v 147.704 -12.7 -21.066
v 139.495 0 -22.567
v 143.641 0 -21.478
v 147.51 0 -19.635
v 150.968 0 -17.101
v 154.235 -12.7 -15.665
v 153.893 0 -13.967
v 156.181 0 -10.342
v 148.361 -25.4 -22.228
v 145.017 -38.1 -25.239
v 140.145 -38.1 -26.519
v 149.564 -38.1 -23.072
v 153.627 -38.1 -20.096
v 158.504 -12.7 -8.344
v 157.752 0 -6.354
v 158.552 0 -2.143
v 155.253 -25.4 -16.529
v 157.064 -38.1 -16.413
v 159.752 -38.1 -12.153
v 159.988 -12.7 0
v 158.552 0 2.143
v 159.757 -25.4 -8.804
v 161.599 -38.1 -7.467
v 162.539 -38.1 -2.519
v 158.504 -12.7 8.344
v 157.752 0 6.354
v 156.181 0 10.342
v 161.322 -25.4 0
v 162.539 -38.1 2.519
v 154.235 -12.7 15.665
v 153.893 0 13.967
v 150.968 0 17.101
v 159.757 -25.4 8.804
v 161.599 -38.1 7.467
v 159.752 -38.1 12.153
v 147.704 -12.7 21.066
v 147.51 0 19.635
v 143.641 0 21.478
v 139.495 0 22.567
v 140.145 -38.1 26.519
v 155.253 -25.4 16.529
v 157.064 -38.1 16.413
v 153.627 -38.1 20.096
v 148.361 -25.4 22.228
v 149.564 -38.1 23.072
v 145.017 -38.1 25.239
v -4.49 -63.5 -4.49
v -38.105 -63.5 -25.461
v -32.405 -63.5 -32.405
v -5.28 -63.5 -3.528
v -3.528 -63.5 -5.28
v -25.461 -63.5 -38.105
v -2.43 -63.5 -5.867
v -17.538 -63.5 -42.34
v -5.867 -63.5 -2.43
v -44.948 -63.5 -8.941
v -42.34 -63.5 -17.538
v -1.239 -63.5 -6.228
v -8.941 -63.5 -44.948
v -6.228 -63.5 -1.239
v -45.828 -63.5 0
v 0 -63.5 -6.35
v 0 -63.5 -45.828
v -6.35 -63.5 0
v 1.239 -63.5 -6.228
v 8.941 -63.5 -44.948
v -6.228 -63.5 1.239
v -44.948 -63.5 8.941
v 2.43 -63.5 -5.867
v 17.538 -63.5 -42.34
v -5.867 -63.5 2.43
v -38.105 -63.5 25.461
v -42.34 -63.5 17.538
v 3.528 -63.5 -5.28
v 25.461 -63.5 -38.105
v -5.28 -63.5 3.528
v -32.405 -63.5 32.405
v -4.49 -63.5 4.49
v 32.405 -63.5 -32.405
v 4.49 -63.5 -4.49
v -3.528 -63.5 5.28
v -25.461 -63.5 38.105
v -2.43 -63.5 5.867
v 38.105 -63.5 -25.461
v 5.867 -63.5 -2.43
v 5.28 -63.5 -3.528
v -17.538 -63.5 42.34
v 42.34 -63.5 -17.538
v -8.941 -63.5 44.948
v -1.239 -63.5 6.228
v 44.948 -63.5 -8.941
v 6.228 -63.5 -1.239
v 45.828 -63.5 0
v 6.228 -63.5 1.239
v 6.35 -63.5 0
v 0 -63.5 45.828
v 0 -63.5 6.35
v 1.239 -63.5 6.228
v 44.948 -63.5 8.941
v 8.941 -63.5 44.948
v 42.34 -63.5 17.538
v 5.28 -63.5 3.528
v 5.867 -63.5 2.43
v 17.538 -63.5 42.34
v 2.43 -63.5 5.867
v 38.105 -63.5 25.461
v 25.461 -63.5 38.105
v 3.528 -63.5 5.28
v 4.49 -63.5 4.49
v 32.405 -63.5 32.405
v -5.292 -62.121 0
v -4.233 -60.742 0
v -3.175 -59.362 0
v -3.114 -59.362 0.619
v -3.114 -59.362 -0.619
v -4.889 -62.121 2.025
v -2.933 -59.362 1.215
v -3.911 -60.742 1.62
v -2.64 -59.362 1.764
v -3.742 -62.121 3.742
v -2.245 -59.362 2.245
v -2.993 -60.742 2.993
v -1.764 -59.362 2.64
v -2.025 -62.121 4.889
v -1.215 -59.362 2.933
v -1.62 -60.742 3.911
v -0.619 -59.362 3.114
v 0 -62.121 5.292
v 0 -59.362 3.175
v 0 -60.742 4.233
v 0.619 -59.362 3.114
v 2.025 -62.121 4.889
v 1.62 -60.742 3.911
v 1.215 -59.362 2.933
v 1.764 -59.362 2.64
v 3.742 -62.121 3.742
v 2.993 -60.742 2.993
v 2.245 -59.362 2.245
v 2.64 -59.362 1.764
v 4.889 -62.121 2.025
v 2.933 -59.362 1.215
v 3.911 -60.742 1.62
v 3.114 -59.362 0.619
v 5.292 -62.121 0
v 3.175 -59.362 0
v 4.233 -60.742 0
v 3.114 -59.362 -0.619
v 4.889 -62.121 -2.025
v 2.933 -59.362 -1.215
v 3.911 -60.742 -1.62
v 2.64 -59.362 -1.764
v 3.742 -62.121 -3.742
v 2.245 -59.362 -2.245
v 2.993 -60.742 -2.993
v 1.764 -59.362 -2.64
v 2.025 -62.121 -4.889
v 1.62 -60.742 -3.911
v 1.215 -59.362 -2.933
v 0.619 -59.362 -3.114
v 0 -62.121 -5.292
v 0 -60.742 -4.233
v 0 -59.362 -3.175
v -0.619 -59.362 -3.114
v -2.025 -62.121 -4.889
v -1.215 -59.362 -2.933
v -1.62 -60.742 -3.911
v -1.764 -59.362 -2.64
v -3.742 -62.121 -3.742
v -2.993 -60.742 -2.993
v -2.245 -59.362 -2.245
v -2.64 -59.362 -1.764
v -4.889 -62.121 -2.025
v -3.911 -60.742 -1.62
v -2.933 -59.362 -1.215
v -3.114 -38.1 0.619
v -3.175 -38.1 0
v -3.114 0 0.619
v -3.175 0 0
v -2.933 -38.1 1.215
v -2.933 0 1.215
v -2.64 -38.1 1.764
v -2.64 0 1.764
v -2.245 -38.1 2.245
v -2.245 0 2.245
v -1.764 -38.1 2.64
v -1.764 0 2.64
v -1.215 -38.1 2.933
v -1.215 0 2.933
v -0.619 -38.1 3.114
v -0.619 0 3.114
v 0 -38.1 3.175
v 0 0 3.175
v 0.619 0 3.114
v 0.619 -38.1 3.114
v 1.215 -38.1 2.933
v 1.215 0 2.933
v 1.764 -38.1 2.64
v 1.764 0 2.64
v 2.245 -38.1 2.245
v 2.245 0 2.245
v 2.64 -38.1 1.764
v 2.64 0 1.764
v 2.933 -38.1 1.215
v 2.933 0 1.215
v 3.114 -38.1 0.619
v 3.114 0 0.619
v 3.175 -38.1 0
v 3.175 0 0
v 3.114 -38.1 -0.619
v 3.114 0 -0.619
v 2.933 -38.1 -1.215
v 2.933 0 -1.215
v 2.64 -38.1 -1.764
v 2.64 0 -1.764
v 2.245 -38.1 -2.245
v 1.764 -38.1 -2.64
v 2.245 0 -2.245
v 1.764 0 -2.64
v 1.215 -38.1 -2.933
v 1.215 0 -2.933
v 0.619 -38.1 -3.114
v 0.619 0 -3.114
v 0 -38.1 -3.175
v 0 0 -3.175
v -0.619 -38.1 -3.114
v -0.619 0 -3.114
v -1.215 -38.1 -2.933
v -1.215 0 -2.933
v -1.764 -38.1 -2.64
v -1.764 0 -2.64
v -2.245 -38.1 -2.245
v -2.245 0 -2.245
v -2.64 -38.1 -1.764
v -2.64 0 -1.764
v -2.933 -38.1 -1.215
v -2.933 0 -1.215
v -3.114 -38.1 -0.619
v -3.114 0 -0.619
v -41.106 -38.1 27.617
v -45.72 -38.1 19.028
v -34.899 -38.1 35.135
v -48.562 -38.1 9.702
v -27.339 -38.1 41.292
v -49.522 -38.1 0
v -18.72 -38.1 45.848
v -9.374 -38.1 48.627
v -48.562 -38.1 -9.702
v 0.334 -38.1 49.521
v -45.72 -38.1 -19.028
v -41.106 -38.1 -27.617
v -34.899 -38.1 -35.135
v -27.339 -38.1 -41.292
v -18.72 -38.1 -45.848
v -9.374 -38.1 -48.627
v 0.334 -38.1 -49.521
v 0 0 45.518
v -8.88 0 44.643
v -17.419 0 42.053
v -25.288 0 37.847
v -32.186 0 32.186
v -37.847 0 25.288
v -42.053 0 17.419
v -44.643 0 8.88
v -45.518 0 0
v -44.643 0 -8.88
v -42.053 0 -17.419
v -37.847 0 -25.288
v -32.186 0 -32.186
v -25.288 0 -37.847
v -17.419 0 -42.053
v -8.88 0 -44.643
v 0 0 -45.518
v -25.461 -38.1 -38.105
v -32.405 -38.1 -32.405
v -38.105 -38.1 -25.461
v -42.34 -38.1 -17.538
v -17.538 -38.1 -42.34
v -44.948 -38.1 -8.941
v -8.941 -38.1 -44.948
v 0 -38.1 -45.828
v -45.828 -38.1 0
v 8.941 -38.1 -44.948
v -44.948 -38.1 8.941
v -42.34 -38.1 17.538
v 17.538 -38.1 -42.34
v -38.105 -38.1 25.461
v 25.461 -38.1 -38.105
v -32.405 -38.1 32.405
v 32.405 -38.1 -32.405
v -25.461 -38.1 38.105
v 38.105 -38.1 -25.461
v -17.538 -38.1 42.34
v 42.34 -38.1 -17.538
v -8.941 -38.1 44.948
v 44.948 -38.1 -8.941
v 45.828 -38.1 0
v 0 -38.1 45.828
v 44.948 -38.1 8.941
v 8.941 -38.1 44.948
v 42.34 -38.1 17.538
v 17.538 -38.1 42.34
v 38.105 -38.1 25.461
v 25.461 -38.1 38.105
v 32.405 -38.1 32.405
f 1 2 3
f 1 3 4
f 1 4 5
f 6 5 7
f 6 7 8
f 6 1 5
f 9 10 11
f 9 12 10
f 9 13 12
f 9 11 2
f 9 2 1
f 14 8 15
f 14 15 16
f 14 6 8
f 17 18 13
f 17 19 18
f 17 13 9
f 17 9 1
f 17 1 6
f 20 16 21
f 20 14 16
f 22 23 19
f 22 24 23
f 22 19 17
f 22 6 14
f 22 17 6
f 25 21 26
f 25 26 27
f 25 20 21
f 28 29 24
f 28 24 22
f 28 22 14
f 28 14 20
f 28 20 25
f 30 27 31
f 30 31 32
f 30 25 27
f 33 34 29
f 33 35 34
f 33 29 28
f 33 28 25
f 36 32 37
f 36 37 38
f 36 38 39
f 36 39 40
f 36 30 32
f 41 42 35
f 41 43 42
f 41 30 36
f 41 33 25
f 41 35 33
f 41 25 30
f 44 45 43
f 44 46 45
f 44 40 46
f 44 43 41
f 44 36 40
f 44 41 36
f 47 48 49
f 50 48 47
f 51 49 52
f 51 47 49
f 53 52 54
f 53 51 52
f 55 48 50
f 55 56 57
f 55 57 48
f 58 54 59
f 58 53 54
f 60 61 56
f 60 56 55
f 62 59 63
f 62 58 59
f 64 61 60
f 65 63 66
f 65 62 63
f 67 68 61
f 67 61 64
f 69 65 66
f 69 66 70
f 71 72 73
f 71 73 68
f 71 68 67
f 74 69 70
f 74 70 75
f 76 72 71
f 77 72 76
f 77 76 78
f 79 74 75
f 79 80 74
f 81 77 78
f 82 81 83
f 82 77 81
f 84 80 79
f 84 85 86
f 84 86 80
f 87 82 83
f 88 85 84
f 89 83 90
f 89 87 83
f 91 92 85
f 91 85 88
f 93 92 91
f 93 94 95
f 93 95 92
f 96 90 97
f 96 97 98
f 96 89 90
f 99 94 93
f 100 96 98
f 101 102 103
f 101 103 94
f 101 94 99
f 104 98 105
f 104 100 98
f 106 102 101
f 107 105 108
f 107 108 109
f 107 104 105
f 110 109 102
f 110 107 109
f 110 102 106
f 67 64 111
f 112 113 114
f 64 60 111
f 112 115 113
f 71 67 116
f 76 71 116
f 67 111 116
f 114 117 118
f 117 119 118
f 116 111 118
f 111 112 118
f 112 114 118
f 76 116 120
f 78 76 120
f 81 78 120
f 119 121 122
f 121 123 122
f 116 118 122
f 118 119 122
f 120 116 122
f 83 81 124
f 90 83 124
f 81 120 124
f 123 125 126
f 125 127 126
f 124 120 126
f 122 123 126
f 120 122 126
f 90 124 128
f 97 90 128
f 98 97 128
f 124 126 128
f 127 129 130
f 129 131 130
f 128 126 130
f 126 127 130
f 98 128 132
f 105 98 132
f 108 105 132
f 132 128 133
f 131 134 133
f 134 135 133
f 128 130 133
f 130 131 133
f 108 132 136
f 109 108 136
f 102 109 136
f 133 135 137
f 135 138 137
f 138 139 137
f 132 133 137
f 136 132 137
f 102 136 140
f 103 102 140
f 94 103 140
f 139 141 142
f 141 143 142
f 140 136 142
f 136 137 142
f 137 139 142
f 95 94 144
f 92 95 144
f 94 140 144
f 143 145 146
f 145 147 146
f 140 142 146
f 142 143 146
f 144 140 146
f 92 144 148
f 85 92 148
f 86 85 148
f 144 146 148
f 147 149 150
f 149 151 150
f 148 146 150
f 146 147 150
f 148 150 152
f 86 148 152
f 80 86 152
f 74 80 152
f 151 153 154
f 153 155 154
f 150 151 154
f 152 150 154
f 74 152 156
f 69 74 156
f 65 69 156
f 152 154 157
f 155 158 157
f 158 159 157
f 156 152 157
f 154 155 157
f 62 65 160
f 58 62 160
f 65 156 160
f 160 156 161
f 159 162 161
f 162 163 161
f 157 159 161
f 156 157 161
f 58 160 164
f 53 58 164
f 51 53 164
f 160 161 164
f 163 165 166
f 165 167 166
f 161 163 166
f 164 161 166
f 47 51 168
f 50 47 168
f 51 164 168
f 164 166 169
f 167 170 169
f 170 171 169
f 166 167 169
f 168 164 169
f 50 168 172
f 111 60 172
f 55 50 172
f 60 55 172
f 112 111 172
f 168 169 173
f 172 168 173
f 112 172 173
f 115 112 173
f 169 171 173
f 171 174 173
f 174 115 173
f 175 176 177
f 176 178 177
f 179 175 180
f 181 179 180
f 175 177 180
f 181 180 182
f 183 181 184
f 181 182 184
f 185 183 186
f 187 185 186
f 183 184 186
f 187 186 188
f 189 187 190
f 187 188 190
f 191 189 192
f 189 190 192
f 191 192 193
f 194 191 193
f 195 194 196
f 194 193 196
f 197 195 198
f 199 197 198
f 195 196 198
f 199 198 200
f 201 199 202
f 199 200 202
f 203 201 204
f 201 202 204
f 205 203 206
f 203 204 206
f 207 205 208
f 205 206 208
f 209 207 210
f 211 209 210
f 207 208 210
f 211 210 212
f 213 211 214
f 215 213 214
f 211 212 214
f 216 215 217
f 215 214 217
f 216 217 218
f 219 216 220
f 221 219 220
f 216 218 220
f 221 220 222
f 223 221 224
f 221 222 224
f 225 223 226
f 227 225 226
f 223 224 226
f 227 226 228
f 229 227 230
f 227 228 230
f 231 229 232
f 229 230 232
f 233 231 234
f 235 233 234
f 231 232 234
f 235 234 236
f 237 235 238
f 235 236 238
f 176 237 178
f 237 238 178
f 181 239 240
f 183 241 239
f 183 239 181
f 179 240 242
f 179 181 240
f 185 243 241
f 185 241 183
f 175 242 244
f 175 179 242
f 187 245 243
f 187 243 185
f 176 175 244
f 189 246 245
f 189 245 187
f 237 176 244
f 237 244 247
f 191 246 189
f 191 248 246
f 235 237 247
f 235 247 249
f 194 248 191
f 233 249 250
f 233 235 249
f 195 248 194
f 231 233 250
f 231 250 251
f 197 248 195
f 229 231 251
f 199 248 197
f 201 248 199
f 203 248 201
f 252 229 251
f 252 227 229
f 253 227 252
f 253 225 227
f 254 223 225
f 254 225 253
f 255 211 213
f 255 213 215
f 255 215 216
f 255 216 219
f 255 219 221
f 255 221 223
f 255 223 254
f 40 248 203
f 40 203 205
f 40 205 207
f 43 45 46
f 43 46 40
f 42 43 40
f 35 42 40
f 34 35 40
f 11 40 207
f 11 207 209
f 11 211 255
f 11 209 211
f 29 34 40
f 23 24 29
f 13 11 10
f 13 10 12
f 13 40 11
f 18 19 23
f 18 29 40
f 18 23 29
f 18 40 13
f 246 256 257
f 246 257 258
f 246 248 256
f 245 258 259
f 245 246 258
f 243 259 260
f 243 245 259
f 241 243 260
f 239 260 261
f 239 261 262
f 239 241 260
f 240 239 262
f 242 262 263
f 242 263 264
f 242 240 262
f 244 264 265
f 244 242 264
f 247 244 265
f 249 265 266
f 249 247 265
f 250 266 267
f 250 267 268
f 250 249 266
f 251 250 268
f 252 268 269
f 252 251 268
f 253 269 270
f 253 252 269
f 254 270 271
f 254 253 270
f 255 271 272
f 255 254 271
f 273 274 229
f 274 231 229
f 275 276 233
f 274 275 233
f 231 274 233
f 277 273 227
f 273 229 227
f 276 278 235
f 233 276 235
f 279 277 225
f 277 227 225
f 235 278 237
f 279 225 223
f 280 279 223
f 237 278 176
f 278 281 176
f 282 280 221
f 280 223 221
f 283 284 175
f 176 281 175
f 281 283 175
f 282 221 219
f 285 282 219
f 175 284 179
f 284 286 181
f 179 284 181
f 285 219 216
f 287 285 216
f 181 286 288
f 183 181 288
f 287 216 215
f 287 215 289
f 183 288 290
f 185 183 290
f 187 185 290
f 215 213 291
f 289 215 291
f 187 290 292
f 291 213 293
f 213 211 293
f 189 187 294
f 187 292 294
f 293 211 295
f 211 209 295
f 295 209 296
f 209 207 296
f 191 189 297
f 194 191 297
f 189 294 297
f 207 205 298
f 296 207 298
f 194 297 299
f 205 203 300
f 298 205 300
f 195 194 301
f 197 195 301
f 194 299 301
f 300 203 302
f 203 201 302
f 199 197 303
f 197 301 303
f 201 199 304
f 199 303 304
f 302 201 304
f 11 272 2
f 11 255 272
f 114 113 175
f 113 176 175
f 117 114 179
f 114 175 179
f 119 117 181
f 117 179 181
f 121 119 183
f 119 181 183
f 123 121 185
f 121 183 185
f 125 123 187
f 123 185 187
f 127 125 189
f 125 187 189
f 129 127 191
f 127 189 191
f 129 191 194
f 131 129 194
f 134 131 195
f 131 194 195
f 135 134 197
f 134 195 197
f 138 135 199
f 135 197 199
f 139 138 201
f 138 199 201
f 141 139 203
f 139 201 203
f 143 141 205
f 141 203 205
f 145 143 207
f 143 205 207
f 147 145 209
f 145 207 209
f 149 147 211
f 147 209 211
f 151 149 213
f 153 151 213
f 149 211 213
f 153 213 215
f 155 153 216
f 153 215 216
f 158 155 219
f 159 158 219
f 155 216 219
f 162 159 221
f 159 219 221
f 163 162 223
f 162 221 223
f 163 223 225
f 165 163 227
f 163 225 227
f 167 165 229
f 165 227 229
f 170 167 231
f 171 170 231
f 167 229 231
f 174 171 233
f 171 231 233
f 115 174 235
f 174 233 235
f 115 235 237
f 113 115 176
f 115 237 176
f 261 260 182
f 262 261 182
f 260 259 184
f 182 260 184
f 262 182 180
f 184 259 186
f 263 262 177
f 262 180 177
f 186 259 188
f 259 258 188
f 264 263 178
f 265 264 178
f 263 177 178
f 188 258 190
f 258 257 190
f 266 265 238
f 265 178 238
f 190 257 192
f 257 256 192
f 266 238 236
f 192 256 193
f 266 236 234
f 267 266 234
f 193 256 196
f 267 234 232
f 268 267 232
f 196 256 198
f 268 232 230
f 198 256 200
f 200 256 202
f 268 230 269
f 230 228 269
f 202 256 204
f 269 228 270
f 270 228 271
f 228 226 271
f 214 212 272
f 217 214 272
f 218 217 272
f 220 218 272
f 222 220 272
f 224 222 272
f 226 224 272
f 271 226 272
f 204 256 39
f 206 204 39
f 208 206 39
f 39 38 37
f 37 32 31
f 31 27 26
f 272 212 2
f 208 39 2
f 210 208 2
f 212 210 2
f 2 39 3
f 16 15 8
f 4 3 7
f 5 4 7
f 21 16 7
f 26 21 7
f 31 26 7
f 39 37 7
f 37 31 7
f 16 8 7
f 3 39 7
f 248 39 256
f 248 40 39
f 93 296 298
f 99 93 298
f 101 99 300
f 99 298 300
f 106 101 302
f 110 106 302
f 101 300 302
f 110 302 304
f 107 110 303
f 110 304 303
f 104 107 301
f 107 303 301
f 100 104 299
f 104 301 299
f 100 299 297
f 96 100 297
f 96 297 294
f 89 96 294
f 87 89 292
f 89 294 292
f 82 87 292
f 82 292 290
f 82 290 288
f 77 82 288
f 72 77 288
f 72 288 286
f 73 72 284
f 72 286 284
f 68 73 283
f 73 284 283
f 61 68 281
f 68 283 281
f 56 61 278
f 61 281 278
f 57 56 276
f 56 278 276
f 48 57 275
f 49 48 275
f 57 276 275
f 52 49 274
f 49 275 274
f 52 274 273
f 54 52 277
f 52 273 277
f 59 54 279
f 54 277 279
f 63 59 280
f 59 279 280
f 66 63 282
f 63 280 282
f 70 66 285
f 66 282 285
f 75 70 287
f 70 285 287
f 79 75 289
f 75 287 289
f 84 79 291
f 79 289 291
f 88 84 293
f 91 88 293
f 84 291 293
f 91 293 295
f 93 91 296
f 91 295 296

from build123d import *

# Parameters (mm, degrees)
F1_DEPTH         = 38.1
F1_TAPER         = -6
F2_R             = 45.8282272946
F3_DEPTH         = 25.4
F5_D             = 6.35
F5_CSINK_D       = 12.7
F5_CSINK_ANGLE   = 75
F5_2_D           = 6.35
F5_2_CSINK_D     = 12.7
F5_2_CSINK_ANGLE = 75


with BuildPart() as f1:
    # F0 (on Front) → F1 (new body)
    with BuildSketch(Plane.XZ):
        with BuildLine():
            Line((0, -45.5176194787), (139.4948799936, -22.5674361626))
            ThreePointArc((139.4948799936, -22.5674361626), (158.6528310814, 0), (139.4948799936, 22.5674361626))
            Line((139.4948799936, 22.5674361626), (0, 45.5176194787))
            ThreePointArc((0, 45.5176194787), (-45.5176194787, 0), (0, -45.5176194787))
        make_face()
    extrude(amount=F1_DEPTH, taper=F1_TAPER)

    # F5 (through all)
    with Locations(Plane.XZ.offset(63.5)):
        with Locations((0, 0)):
            CounterSinkHole(F5_D / 2, F5_CSINK_D / 2, counter_sink_angle=F5_CSINK_ANGLE)


with BuildPart() as f3:
    # F2 (on face) → F3 (new body)
    with BuildSketch(Plane.XZ.offset(38.1)):
        Circle(F2_R)
    extrude(amount=F3_DEPTH)

    # F5#2 (through all)
    with Locations(Plane.XZ.offset(63.5)):
        with Locations((0, 0)):
            CounterSinkHole(F5_2_D / 2, F5_2_CSINK_D / 2, counter_sink_angle=F5_2_CSINK_ANGLE)


solid = Compound([f1.part, f3.part])
